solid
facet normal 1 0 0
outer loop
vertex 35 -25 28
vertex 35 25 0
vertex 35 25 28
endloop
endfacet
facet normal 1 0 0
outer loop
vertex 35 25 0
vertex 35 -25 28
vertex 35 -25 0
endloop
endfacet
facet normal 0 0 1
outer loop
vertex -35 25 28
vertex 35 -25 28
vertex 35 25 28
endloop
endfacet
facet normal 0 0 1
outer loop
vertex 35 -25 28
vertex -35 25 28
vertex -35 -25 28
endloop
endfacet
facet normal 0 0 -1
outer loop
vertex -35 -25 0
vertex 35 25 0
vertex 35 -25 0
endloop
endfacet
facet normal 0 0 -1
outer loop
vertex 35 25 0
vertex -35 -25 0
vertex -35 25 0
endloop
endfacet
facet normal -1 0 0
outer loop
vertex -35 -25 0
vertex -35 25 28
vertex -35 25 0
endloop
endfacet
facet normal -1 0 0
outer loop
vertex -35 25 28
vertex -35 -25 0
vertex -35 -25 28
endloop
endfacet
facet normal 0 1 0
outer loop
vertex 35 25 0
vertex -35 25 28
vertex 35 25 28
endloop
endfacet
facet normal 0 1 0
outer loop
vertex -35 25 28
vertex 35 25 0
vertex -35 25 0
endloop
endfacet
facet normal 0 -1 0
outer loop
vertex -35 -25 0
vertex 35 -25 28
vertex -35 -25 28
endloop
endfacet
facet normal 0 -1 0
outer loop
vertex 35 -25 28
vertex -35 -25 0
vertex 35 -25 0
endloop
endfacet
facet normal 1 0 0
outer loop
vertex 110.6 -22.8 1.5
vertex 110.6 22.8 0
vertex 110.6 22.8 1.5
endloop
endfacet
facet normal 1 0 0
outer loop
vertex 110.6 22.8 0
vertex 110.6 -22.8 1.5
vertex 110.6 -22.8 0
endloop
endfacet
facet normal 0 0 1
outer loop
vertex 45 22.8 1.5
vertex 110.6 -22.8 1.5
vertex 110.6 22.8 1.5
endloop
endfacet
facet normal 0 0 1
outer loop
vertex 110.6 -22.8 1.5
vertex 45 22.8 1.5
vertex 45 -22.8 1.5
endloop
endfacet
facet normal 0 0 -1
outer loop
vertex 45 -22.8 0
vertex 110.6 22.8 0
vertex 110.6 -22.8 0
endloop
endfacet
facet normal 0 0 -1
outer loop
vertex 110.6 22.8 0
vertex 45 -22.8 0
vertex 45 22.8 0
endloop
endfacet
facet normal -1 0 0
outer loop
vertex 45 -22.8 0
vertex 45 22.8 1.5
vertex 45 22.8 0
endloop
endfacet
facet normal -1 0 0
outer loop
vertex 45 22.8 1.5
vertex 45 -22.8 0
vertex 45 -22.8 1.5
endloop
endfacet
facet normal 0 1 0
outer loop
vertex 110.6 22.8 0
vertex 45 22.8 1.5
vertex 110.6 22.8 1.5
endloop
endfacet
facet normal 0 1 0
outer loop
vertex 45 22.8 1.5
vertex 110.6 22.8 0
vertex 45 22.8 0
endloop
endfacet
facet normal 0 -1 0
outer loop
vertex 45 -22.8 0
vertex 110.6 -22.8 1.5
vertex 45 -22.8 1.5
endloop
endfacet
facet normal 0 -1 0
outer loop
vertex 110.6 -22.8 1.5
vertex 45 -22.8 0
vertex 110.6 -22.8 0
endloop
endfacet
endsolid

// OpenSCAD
// Two-part enclosure for a small electronics board (e.g. Arduino-based temperature logger)
// Prints together in one job: box on the left, upside-down lid on the right, with a gap.

// ---------------- Parameters ----------------
box_x      = 70;    // box outer length (X)
box_y      = 50;    // box outer width (Y)
box_z      = 30;    // box height (Z)
wall       = 2;     // box wall thickness
floor      = 2;     // box floor thickness
eps        = 0.5;   // cutter overshoot past faces

lip_t      = 1.5;   // lid lip wall thickness
lip_h      = 4;     // lid lip height
lip_x      = 65.6;  // lid lip outer length (X)
lip_y      = 45.6;  // lid lip outer width (Y)

gap        = 10;    // horizontal gap between the two parts
clearance  = 0.2;   // clearance between lip and box opening

$fn = 64;

// Derived
box_in_x = box_x - 2 * wall;
box_in_y = box_y - 2 * wall;
lip_x1   = lip_x - 2 * clearance;   // lip inner size (X)
lip_y1   = lip_y - 2 * clearance;   // lip inner size (Y)

// ---------------- Model ----------------
union() {
    // Part 1: box, open top
    translate([-box_x / 2, -box_y / 2, 0])
        cube([box_x, box_y, box_z - floor]);

    // Part 2: lid, printed upside down with a rectangular lip
    translate([box_x / 2 + gap, -lip_y / 2, 0])
        cube([lip_x, lip_y, lip_t]);                                     // lip base plate
    translate([lip_x1 / 2, lip_y1 / 2, lip_h])
        cube([lip_x - lip_x1, lip_y - lip_y1, lip_t]);                   // lip walls (open top)
}
